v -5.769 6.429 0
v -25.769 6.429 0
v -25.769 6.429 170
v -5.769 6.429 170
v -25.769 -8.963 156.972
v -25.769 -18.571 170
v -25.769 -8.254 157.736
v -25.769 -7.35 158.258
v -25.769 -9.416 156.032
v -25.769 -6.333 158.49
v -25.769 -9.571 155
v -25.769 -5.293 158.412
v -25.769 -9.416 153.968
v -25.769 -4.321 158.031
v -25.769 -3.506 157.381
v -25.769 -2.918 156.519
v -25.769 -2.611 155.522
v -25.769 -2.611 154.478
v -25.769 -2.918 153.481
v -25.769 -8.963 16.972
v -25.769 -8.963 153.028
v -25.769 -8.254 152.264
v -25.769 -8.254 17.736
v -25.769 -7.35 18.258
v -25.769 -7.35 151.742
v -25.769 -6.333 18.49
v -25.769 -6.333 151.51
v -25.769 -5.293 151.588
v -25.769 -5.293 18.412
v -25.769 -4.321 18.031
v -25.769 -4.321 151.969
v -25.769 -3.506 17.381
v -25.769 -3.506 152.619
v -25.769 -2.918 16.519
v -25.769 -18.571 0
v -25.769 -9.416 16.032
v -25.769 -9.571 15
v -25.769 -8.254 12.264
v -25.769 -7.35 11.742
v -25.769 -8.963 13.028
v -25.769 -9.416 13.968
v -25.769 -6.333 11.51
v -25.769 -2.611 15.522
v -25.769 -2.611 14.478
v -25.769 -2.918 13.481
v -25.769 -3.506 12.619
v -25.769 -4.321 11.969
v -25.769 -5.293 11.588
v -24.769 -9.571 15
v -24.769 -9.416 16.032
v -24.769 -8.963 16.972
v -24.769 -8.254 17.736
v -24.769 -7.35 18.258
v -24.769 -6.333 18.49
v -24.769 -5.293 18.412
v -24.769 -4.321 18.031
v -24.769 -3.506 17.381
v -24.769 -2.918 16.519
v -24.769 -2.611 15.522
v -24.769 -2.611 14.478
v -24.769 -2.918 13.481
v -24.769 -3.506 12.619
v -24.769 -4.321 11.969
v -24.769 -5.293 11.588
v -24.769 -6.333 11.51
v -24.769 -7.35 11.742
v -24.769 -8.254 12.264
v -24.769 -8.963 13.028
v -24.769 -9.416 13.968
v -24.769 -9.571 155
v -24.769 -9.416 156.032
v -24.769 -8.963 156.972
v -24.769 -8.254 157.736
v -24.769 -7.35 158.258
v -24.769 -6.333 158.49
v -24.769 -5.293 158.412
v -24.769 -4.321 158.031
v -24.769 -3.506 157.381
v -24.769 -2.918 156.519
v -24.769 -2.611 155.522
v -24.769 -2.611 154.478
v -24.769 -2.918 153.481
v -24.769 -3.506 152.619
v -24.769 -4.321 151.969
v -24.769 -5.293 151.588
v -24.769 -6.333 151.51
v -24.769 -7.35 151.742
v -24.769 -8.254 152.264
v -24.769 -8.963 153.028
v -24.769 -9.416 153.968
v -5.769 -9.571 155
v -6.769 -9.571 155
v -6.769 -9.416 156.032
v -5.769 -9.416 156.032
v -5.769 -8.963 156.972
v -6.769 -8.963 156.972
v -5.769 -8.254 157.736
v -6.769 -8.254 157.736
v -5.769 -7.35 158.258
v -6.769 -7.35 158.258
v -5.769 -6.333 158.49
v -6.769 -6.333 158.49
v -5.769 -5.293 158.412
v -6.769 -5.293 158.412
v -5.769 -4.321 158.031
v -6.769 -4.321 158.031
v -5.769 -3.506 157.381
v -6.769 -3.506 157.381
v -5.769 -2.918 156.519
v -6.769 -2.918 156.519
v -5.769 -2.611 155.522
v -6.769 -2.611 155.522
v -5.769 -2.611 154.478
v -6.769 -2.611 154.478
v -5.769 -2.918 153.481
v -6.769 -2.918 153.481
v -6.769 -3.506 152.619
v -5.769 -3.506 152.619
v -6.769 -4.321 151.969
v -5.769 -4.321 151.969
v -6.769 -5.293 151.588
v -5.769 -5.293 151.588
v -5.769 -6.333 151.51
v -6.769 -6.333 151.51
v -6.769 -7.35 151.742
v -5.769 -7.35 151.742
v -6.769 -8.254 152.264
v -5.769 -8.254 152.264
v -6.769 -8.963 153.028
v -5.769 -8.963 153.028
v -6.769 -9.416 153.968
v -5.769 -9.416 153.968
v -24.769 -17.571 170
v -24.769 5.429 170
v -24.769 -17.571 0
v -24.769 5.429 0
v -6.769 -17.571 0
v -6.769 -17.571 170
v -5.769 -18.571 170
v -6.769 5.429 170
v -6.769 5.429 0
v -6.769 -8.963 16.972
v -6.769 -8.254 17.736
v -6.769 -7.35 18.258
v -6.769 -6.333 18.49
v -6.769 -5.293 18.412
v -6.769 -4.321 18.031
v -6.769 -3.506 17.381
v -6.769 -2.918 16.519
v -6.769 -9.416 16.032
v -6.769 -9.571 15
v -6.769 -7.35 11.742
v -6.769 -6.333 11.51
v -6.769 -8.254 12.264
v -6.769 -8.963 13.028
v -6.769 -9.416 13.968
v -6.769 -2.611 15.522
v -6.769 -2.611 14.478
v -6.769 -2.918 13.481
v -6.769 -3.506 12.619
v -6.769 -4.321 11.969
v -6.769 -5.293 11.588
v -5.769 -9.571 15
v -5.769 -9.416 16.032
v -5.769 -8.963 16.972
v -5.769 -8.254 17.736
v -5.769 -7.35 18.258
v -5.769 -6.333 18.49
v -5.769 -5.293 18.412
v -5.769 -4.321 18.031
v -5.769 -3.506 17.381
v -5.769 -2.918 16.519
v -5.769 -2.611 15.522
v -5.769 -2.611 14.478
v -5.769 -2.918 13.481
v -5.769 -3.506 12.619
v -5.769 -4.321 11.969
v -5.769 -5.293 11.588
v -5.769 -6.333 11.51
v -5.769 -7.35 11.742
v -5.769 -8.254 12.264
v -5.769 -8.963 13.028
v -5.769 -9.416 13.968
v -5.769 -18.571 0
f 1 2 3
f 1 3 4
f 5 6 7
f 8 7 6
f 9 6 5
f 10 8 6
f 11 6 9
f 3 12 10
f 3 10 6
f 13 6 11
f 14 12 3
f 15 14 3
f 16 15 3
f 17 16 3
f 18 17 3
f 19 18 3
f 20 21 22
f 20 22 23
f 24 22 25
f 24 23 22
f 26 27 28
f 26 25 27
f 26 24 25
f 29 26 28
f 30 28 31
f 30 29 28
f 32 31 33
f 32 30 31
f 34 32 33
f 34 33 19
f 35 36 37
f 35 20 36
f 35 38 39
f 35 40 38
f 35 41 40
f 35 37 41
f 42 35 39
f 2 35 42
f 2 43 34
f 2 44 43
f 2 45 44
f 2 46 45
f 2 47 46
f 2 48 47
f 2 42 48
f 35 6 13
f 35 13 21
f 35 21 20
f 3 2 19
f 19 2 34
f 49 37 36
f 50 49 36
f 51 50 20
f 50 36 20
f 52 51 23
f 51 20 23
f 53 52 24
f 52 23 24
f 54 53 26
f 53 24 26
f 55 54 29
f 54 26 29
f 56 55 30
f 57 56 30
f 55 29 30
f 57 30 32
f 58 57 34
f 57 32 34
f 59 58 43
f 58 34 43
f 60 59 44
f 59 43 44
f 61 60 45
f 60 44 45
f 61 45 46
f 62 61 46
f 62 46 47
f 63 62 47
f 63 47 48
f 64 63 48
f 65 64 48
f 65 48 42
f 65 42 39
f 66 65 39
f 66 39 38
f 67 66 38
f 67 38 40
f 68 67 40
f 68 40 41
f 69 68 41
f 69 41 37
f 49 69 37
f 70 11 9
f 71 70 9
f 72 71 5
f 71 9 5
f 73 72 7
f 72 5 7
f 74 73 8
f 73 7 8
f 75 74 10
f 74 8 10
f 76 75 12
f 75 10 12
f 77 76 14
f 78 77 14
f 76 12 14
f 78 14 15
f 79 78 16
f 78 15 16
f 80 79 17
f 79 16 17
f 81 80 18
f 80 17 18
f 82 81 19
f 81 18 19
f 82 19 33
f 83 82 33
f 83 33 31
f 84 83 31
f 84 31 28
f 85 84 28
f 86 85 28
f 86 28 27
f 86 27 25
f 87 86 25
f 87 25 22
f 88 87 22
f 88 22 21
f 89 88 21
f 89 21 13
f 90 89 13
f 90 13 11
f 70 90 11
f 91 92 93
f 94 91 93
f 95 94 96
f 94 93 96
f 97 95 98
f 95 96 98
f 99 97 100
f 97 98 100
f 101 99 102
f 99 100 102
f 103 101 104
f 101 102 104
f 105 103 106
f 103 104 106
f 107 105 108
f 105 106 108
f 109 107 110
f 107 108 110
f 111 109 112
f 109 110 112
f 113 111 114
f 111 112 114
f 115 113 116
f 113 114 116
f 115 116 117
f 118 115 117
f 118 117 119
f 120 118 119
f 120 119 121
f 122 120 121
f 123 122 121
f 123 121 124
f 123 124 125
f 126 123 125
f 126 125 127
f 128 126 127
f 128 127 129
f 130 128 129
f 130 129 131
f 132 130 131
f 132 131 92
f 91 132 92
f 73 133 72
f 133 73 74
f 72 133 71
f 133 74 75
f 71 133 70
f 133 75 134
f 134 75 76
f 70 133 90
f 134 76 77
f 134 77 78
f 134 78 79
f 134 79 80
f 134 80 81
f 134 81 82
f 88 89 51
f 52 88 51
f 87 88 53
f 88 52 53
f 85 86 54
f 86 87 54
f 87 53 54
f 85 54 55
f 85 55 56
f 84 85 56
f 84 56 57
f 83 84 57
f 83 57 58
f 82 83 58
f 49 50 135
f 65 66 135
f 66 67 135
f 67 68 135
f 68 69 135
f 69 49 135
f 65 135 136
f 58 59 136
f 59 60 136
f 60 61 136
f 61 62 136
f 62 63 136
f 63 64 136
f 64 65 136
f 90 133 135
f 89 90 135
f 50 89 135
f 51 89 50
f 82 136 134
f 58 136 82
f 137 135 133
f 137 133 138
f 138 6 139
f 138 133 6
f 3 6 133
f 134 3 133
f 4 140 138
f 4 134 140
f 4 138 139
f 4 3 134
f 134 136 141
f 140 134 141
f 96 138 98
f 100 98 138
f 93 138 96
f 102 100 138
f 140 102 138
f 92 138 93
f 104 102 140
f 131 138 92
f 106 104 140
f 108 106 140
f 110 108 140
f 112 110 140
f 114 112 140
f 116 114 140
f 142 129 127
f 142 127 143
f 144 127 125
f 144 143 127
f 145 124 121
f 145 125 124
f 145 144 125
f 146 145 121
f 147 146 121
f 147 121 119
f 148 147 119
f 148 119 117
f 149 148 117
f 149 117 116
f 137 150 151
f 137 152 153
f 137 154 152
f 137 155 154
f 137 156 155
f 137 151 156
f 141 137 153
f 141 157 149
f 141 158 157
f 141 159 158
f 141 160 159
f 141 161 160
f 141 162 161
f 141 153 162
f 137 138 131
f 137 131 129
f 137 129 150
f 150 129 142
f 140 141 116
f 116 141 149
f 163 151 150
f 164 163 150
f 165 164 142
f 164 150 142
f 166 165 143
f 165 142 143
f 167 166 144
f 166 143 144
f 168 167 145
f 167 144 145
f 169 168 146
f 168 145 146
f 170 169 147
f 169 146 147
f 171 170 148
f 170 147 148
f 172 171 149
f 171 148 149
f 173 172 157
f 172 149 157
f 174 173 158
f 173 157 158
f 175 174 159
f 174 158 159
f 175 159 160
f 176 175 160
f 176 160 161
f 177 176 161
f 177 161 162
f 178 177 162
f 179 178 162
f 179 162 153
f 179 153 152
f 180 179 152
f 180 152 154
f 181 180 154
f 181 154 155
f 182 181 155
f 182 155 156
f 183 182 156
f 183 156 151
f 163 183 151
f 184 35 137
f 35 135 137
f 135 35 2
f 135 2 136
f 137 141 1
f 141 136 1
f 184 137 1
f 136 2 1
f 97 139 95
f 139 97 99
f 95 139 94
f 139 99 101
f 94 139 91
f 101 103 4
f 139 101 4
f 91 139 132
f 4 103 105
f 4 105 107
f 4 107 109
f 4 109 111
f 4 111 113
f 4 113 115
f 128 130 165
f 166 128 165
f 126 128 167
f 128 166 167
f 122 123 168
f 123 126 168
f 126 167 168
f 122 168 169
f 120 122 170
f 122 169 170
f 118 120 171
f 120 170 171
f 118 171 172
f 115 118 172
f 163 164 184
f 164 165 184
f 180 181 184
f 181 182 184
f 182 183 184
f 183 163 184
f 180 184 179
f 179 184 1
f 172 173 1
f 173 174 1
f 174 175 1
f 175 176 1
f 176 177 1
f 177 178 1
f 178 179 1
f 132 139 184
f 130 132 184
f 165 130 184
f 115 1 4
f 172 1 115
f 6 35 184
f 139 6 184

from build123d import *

# Parameters (mm, degrees)
SKETCH1_W           = 20
SKETCH1_H           = 25
BOSS_EXTRUDE1_DEPTH = 170
SHELL1_T            = -1
SKETCH2_R           = 3.5
CUT_EXTRUDE1_DEPTH  = 170


with BuildPart() as part:
    # Sketch1 → Boss-Extrude1 (new body)
    with BuildSketch(Plane.XY):
        with Locations((-15.769295372, -6.071428571)):
            Rectangle(SKETCH1_W, SKETCH1_H)
    extrude(amount=BOSS_EXTRUDE1_DEPTH)

    # Shell1
    shell1_openings = [part.faces().sort_by_distance(p)[0] for p in [
        (-15.769295372, -6.071428571, 170),
        (-15.769295372, -6.071428571, 0),
    ]]
    offset(amount=SHELL1_T, openings=shell1_openings, kind=Kind.INTERSECTION)

    # Sketch2 → Cut-Extrude1 (cut)
    with BuildSketch(Plane.ZY.offset(25.769295372)):
        with Locations(Location((15, -6.071428571, 0), (0, 0, 270))):
            Circle(SKETCH2_R)
        with Locations(Location((155, -6.071428571, 0), (0, 0, 270))):
            Circle(SKETCH2_R)
    extrude(amount=-CUT_EXTRUDE1_DEPTH, mode=Mode.SUBTRACT)


solid = part.part
